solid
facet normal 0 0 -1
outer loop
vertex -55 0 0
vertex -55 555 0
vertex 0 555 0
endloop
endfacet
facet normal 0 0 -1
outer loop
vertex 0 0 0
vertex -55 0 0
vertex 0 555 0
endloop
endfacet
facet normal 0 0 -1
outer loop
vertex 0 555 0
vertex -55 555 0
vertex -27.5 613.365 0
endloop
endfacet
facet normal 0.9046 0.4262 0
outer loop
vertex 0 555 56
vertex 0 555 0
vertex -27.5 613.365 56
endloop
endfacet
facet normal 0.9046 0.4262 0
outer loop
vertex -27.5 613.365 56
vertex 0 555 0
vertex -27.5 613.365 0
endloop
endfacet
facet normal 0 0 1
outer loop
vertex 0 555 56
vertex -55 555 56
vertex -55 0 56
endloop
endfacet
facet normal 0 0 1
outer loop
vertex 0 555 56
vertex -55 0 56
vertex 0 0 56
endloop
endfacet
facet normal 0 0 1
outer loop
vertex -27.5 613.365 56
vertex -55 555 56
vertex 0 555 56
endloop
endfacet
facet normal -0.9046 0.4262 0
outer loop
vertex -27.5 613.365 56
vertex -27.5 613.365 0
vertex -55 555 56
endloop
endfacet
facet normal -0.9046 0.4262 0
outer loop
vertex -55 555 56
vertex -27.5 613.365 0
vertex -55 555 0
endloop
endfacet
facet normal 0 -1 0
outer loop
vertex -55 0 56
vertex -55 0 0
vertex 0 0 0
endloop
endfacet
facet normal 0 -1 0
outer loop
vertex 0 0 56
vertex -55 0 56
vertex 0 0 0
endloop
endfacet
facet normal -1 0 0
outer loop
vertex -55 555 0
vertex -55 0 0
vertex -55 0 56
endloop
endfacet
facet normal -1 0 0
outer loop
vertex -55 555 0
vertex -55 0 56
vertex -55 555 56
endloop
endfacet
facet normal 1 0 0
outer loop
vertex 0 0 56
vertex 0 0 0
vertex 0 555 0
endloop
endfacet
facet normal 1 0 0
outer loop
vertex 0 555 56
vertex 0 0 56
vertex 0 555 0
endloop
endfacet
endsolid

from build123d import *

# Parameters (mm, degrees)
F0_W     = 55
F0_H     = 555
F1_DEPTH = 56


with BuildPart() as f1:
    # F0 (on Top) → F1 (new body)
    with BuildSketch(Plane.XY):
        with Locations((-27.5, 277.5)):
            Rectangle(F0_W, F0_H)
        Polygon((-55, 555), (0, 555), (-27.5, 613.364637), align=None)
    extrude(amount=F1_DEPTH)


solid = f1.part
